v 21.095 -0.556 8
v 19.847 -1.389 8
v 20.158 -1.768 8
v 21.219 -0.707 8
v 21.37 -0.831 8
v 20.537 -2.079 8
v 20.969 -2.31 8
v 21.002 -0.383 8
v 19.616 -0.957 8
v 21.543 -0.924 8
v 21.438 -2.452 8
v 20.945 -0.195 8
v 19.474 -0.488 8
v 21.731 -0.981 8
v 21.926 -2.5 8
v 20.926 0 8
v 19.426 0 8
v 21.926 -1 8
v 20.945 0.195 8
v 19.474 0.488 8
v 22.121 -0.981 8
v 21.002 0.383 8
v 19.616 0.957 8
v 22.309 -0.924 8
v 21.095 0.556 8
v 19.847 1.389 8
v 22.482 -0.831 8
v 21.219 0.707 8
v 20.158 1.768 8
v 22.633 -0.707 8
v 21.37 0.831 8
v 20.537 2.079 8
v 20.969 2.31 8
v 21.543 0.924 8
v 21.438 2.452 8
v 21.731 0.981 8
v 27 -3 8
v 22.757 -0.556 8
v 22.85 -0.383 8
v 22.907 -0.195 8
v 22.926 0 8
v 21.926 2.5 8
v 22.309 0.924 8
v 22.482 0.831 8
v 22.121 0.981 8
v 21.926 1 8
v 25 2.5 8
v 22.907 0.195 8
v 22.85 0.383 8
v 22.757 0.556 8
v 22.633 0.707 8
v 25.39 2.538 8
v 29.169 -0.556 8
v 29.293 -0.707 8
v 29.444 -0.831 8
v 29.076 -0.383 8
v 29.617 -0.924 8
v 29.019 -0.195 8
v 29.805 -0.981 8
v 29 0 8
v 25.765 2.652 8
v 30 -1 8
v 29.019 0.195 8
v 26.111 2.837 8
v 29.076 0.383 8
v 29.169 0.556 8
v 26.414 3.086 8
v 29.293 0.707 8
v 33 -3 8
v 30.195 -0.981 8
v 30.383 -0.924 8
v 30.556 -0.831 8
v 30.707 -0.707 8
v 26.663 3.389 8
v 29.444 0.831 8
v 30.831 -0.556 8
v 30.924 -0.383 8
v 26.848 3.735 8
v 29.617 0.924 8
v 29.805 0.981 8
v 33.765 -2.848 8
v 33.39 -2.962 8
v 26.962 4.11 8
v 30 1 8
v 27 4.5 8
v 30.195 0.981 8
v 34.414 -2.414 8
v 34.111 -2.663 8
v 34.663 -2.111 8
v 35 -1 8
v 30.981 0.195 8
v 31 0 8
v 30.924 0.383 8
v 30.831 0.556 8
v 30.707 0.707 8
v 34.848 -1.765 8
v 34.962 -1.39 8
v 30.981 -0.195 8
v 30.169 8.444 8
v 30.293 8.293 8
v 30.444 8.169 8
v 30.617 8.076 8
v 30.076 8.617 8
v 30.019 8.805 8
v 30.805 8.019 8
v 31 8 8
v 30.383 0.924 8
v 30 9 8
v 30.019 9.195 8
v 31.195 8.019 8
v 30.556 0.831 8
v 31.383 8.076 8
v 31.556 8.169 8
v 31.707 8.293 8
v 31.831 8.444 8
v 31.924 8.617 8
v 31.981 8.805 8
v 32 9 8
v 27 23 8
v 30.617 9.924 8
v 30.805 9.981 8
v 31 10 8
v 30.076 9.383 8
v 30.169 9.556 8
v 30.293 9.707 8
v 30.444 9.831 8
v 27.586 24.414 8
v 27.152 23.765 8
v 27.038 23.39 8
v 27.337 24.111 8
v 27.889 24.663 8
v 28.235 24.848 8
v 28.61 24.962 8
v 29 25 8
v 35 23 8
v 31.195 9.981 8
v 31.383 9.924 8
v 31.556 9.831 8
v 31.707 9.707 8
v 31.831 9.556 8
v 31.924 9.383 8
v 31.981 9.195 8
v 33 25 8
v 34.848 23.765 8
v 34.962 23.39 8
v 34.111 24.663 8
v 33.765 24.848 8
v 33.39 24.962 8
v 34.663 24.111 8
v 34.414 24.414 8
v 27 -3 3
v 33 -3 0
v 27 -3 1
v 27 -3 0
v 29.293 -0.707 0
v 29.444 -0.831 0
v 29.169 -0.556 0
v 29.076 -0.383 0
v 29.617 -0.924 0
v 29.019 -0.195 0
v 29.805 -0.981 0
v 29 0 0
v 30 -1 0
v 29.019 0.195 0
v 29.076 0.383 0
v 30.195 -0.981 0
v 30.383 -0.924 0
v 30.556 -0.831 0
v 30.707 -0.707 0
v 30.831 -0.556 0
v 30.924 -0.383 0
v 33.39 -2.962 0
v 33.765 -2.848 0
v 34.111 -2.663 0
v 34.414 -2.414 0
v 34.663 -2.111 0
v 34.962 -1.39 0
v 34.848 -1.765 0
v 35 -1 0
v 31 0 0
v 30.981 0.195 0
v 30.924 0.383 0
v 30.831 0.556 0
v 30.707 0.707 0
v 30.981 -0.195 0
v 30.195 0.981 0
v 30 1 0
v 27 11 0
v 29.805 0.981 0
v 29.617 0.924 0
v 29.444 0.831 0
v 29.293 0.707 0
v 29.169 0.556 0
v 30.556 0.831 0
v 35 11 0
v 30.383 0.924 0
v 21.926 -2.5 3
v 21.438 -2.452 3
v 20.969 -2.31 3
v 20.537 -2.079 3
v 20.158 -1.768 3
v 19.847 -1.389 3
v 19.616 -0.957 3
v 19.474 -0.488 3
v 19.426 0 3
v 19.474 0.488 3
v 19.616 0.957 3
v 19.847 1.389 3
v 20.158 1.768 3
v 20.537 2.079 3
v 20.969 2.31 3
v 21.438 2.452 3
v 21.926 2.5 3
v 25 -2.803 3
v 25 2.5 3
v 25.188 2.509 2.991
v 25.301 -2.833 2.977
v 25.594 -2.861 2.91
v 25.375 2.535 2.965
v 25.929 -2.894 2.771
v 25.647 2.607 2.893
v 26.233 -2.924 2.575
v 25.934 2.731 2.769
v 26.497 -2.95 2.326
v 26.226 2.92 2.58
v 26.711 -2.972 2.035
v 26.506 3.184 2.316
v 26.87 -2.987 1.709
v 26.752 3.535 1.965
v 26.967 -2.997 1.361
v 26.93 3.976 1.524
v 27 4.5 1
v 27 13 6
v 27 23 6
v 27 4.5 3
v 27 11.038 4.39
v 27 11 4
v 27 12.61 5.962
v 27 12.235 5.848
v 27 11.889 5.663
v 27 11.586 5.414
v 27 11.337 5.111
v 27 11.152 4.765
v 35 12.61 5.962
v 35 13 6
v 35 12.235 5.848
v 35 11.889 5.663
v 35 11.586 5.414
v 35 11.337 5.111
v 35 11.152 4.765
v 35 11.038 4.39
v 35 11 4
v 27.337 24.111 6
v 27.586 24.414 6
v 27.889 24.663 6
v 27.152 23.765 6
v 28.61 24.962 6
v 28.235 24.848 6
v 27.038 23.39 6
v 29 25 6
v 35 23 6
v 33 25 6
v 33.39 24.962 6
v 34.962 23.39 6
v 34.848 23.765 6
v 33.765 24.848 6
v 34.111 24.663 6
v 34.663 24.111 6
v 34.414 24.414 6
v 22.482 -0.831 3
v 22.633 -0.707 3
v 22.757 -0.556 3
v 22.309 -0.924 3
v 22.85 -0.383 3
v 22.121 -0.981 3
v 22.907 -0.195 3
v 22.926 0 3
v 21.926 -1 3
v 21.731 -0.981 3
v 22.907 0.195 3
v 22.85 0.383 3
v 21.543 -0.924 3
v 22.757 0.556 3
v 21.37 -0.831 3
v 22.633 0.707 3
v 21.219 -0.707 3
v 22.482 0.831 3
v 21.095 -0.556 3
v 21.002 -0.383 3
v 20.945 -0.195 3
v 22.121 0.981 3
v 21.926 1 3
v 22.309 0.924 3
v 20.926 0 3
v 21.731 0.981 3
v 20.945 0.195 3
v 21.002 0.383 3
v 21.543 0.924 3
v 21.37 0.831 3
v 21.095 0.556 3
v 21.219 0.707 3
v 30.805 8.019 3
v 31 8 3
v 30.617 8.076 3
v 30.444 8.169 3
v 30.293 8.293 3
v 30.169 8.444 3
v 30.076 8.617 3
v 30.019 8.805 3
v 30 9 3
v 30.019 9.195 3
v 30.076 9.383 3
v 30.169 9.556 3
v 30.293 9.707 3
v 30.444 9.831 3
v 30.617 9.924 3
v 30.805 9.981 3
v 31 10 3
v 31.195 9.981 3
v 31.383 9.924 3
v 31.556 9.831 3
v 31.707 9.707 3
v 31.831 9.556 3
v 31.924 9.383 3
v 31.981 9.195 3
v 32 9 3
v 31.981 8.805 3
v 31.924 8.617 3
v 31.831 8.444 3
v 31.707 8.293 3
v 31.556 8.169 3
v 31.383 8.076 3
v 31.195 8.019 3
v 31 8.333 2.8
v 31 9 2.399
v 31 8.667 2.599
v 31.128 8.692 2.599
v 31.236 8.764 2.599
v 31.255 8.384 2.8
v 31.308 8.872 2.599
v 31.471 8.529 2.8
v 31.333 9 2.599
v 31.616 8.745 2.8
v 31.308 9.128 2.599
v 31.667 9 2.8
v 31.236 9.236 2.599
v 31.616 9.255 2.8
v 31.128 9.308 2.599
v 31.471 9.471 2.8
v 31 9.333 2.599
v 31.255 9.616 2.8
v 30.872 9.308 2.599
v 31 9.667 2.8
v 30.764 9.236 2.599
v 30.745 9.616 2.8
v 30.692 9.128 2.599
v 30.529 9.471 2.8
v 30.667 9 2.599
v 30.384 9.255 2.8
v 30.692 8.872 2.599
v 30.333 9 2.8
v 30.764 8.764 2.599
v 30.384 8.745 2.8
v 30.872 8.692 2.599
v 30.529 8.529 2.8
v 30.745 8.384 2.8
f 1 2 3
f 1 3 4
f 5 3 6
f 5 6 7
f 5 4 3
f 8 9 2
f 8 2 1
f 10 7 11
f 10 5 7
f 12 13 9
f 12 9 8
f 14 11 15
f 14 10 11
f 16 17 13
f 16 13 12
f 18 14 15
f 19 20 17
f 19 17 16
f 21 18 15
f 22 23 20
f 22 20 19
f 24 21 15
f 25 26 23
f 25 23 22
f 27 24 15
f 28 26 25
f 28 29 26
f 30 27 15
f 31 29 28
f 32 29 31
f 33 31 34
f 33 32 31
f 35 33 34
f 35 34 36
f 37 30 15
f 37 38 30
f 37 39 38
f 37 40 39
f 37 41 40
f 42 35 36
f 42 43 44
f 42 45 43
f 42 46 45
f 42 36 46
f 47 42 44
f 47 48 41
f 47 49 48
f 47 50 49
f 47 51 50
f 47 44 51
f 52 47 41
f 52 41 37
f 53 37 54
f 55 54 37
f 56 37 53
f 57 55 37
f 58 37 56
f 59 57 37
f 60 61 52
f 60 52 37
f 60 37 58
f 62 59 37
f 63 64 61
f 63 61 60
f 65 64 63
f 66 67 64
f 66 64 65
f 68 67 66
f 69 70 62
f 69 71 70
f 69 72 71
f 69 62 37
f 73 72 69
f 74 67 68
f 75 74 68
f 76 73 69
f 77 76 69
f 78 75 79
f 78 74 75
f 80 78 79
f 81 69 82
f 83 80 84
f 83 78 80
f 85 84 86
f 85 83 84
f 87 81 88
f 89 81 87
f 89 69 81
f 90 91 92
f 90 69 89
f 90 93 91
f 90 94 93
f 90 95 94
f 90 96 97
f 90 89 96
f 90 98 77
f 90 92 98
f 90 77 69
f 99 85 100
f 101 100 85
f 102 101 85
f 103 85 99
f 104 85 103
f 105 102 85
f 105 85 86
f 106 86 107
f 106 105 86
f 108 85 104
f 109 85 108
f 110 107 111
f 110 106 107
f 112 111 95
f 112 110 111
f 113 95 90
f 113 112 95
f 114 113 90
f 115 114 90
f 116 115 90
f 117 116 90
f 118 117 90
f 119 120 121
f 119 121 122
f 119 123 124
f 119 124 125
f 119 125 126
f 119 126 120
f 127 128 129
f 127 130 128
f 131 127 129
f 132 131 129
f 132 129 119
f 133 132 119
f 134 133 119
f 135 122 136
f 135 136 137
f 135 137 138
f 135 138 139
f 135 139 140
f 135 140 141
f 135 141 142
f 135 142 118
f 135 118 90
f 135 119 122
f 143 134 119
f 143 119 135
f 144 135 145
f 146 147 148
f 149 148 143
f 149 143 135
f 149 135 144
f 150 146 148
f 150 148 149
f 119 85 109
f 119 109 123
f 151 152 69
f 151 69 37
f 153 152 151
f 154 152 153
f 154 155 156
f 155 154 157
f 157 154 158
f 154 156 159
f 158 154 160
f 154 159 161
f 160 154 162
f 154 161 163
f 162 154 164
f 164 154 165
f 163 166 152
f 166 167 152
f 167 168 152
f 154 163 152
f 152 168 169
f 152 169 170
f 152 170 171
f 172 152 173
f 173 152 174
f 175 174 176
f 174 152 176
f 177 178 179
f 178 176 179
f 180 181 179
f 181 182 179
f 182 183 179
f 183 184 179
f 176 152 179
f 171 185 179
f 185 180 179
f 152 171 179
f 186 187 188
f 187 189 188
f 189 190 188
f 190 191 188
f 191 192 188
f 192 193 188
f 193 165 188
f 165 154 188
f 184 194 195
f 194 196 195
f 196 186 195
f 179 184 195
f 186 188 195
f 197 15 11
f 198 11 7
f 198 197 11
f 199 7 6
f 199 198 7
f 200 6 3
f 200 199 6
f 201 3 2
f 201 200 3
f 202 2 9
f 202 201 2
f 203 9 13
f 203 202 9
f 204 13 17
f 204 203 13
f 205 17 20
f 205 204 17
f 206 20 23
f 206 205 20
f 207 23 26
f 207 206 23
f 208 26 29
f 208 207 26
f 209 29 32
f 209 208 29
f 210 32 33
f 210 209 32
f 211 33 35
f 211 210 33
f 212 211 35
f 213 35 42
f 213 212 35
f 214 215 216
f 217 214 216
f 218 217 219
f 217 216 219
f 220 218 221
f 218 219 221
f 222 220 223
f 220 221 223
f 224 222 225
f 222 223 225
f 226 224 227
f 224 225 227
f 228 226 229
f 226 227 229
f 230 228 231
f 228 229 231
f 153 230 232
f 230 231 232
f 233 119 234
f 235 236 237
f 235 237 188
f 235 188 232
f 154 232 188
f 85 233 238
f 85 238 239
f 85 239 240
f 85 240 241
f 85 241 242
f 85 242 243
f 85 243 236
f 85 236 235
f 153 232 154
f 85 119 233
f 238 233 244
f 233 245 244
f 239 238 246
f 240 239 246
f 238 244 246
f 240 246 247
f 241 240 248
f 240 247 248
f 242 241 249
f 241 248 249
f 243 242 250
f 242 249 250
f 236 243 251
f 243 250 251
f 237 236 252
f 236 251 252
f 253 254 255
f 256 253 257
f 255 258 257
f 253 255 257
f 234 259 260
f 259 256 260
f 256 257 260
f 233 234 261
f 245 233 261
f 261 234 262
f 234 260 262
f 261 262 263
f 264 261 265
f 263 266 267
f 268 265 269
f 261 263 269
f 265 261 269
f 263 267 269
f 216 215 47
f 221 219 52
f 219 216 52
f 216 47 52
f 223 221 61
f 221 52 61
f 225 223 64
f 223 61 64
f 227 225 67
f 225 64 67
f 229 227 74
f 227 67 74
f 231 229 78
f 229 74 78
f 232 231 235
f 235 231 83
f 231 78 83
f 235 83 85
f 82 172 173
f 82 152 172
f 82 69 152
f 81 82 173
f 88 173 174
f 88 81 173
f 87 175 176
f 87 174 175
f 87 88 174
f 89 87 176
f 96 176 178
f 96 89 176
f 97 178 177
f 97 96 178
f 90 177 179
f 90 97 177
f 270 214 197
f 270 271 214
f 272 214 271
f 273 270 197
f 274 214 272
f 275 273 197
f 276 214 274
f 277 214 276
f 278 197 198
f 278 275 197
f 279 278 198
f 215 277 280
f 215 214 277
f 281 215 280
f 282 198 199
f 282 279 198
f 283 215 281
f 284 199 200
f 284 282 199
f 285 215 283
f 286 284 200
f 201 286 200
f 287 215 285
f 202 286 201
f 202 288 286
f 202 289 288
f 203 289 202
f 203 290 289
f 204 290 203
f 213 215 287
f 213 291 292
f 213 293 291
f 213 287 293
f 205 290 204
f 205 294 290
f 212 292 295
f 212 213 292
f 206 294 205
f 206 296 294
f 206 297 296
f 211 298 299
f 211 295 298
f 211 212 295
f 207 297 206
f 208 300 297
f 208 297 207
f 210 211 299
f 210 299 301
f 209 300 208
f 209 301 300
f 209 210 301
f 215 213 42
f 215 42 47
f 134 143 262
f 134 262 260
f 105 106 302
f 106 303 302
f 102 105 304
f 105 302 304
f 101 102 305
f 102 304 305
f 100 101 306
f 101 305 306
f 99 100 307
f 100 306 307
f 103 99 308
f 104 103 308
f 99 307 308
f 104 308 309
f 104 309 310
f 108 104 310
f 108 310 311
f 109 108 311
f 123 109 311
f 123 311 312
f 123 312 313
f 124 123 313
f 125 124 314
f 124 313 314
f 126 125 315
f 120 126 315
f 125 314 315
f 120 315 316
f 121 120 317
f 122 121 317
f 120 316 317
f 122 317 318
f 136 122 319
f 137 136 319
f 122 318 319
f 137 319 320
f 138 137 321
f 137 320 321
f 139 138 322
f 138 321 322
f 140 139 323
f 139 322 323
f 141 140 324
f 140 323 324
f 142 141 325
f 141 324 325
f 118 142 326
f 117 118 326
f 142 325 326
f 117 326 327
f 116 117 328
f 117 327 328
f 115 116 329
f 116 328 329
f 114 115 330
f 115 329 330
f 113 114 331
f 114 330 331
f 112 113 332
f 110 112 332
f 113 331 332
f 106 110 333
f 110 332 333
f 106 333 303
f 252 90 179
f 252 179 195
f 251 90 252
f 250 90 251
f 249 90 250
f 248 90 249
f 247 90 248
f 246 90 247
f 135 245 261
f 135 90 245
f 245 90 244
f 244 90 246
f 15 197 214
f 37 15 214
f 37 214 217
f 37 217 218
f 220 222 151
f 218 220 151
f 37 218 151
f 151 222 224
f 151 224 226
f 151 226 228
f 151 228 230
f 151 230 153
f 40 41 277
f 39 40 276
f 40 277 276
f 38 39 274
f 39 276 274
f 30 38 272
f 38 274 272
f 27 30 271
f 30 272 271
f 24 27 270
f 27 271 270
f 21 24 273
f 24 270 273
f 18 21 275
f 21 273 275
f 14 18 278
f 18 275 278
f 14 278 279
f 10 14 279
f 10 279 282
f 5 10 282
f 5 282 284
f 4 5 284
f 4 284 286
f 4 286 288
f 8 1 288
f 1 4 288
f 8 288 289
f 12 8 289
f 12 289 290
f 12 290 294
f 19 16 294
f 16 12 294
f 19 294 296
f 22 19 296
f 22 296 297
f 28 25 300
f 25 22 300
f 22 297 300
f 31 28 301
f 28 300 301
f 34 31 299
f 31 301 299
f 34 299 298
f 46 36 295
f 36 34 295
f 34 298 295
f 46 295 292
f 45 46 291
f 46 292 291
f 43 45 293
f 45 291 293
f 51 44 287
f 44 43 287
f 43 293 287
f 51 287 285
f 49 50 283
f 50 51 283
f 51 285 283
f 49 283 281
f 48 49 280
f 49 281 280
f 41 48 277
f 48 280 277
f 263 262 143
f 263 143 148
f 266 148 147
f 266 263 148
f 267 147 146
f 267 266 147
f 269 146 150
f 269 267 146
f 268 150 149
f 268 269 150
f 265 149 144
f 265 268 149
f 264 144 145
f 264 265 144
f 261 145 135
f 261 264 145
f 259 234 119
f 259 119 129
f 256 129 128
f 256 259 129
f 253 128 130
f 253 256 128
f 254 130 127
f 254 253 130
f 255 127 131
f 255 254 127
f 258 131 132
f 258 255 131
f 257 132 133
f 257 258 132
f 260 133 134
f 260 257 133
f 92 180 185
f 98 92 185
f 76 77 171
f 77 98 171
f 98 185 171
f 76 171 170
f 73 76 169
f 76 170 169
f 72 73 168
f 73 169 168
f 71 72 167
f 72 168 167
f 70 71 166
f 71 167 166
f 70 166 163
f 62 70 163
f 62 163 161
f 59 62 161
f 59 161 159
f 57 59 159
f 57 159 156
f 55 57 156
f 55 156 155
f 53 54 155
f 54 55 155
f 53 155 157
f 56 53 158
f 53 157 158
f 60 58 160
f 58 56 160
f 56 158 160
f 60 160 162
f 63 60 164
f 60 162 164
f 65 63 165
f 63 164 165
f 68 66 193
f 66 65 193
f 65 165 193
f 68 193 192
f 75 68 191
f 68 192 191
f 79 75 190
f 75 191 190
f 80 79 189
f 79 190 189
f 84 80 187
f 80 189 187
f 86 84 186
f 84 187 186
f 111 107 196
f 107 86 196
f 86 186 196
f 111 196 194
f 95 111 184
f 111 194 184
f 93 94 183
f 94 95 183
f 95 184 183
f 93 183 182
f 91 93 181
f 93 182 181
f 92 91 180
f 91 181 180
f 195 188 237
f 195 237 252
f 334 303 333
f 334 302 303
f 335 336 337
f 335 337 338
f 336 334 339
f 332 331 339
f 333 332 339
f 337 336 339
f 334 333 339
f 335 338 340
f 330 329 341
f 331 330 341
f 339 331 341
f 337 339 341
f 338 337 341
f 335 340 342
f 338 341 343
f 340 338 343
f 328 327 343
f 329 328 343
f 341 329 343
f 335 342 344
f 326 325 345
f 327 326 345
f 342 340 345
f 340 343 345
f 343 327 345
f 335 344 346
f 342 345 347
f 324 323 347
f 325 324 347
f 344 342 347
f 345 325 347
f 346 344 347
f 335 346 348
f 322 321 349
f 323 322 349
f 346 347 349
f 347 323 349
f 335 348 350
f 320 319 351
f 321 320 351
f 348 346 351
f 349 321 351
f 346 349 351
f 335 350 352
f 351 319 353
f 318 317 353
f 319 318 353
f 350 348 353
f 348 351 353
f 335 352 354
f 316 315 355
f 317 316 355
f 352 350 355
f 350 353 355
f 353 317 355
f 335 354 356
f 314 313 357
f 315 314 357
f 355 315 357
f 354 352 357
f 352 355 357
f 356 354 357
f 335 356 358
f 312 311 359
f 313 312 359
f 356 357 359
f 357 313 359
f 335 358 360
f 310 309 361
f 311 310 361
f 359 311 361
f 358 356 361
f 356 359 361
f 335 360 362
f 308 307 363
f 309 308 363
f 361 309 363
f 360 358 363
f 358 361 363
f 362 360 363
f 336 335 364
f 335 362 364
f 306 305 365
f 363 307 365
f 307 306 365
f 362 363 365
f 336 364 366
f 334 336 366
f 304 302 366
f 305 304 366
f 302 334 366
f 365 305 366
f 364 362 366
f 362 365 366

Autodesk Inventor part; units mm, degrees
ref_plane "YZ Plane" through (0, 0, 0) normal (1, 0, 0) x (0, 1, 0)
ref_plane "XZ Plane" through (0, 0, 0) normal (0, 1, 0) x (-1, 0, 0)
ref_plane "XY Plane" through (0, 0, 0) normal (0, 0, 1) x (1, 0, 0)
sketch "Sketch1" plane through (0, 0, 0) normal (0, 0, 1) x (1, 0, 0)
  circle A0 centre (30, 0) radius 1
  circle A1 centre (21.926, 0) radius 1
  line L0 (27, 11) -> (35, 11)
  line L1 (35, 11) -> (35, -3)
  line L2 (35, -3) -> (27, -3)
  line L3 (27, -3) -> (27, 11)
  circle A2 centre (21.926, 0) radius 2.5
  line L4 (21.926, -2.5) -> (27, -3)
  line L5 (21.926, 2.5) -> (27, 2.5)
  point P0 (0, 0)
  dimension "d0" = 21.926
  dimension "d1" = 30
  dimension "d2" = 2
  dimension "d3" = 2
  dimension "d4" = 3
  dimension "d5" = 5
  dimension "d6" = 3
  dimension "d7" = 11
  dimension "d8" = 5
extrude "Extrusion1" add sketch "Sketch1" along normal blind 8
fillet "Fillet1" radius 2 2 edges at (27, 2.5, 4) (35, -3, 4)
sketch "Sketch2" plane through (0, 0, 8) normal (0, 0, 1) x (1, 0, 0)
  line L0 (27, 11) -> (27, 4.5) projected
  line L1 (27, 11) -> (35, 11)
  line L2 (35, 11) -> (35, 25)
  line L3 (35, 25) -> (27, 25)
  line L4 (27, 25) -> (27, 11)
  line L5 (35, -1) -> (35, 11) projected
  circle A0 centre (30, 0) radius 1 projected
  point P0 (0, 0)
  dimension "d12" = 25
extrude "Extrusion2" add sketch "Sketch2" against normal blind 2 contours L4 L3 L2 L1
fillet "Fillet2" radius 2 1 edges at (31, 11, 6)
fillet "Fillet3" radius 2 2 edges at (35, 25, 7) (27, 25, 7)
sketch "Sketch3" plane through (0, 0, 8) normal (0, 0, 1) x (1, 0, 0)
  line L0 (35, -1) -> (35, 23) projected
  line L1 (27, 23) -> (27, 4.5) projected
  circle A0 centre (30, 0) radius 1 projected
  point P0 (0, 0)
  point P1 (31, 9)
  dimension "d17" = 8
  dimension "d18" = 4
  dimension "d19" = 9
hole "Hole1" at (31, 9, 8) direction (0, 0, -1) diameter 2 depth 5 tip angle 118
sketch "Sketch4" plane through (0, 0, 0) normal (0, 0, -1) x (-1, 0, 0)
  line L0 (-27, 11) -> (-27, 4.5) projected
  line L1 (-17, -3) -> (-27, -3)
  line L2 (-27, -3) -> (-27, 5)
  line L3 (-27, 5) -> (-17, 5)
  line L4 (-17, 5) -> (-17, -3)
  line L5 (-27, -3) -> (-33, -3) projected
  point P0 (0, 0)
  dimension "d27" = 10
  dimension "d28" = 8
extrude "Extrusion3" cut sketch "Sketch4" against normal blind 3
fillet "Fillet4" radius 2 1 edges at (27, 0.75, 3)
properties part number "front_v2"
